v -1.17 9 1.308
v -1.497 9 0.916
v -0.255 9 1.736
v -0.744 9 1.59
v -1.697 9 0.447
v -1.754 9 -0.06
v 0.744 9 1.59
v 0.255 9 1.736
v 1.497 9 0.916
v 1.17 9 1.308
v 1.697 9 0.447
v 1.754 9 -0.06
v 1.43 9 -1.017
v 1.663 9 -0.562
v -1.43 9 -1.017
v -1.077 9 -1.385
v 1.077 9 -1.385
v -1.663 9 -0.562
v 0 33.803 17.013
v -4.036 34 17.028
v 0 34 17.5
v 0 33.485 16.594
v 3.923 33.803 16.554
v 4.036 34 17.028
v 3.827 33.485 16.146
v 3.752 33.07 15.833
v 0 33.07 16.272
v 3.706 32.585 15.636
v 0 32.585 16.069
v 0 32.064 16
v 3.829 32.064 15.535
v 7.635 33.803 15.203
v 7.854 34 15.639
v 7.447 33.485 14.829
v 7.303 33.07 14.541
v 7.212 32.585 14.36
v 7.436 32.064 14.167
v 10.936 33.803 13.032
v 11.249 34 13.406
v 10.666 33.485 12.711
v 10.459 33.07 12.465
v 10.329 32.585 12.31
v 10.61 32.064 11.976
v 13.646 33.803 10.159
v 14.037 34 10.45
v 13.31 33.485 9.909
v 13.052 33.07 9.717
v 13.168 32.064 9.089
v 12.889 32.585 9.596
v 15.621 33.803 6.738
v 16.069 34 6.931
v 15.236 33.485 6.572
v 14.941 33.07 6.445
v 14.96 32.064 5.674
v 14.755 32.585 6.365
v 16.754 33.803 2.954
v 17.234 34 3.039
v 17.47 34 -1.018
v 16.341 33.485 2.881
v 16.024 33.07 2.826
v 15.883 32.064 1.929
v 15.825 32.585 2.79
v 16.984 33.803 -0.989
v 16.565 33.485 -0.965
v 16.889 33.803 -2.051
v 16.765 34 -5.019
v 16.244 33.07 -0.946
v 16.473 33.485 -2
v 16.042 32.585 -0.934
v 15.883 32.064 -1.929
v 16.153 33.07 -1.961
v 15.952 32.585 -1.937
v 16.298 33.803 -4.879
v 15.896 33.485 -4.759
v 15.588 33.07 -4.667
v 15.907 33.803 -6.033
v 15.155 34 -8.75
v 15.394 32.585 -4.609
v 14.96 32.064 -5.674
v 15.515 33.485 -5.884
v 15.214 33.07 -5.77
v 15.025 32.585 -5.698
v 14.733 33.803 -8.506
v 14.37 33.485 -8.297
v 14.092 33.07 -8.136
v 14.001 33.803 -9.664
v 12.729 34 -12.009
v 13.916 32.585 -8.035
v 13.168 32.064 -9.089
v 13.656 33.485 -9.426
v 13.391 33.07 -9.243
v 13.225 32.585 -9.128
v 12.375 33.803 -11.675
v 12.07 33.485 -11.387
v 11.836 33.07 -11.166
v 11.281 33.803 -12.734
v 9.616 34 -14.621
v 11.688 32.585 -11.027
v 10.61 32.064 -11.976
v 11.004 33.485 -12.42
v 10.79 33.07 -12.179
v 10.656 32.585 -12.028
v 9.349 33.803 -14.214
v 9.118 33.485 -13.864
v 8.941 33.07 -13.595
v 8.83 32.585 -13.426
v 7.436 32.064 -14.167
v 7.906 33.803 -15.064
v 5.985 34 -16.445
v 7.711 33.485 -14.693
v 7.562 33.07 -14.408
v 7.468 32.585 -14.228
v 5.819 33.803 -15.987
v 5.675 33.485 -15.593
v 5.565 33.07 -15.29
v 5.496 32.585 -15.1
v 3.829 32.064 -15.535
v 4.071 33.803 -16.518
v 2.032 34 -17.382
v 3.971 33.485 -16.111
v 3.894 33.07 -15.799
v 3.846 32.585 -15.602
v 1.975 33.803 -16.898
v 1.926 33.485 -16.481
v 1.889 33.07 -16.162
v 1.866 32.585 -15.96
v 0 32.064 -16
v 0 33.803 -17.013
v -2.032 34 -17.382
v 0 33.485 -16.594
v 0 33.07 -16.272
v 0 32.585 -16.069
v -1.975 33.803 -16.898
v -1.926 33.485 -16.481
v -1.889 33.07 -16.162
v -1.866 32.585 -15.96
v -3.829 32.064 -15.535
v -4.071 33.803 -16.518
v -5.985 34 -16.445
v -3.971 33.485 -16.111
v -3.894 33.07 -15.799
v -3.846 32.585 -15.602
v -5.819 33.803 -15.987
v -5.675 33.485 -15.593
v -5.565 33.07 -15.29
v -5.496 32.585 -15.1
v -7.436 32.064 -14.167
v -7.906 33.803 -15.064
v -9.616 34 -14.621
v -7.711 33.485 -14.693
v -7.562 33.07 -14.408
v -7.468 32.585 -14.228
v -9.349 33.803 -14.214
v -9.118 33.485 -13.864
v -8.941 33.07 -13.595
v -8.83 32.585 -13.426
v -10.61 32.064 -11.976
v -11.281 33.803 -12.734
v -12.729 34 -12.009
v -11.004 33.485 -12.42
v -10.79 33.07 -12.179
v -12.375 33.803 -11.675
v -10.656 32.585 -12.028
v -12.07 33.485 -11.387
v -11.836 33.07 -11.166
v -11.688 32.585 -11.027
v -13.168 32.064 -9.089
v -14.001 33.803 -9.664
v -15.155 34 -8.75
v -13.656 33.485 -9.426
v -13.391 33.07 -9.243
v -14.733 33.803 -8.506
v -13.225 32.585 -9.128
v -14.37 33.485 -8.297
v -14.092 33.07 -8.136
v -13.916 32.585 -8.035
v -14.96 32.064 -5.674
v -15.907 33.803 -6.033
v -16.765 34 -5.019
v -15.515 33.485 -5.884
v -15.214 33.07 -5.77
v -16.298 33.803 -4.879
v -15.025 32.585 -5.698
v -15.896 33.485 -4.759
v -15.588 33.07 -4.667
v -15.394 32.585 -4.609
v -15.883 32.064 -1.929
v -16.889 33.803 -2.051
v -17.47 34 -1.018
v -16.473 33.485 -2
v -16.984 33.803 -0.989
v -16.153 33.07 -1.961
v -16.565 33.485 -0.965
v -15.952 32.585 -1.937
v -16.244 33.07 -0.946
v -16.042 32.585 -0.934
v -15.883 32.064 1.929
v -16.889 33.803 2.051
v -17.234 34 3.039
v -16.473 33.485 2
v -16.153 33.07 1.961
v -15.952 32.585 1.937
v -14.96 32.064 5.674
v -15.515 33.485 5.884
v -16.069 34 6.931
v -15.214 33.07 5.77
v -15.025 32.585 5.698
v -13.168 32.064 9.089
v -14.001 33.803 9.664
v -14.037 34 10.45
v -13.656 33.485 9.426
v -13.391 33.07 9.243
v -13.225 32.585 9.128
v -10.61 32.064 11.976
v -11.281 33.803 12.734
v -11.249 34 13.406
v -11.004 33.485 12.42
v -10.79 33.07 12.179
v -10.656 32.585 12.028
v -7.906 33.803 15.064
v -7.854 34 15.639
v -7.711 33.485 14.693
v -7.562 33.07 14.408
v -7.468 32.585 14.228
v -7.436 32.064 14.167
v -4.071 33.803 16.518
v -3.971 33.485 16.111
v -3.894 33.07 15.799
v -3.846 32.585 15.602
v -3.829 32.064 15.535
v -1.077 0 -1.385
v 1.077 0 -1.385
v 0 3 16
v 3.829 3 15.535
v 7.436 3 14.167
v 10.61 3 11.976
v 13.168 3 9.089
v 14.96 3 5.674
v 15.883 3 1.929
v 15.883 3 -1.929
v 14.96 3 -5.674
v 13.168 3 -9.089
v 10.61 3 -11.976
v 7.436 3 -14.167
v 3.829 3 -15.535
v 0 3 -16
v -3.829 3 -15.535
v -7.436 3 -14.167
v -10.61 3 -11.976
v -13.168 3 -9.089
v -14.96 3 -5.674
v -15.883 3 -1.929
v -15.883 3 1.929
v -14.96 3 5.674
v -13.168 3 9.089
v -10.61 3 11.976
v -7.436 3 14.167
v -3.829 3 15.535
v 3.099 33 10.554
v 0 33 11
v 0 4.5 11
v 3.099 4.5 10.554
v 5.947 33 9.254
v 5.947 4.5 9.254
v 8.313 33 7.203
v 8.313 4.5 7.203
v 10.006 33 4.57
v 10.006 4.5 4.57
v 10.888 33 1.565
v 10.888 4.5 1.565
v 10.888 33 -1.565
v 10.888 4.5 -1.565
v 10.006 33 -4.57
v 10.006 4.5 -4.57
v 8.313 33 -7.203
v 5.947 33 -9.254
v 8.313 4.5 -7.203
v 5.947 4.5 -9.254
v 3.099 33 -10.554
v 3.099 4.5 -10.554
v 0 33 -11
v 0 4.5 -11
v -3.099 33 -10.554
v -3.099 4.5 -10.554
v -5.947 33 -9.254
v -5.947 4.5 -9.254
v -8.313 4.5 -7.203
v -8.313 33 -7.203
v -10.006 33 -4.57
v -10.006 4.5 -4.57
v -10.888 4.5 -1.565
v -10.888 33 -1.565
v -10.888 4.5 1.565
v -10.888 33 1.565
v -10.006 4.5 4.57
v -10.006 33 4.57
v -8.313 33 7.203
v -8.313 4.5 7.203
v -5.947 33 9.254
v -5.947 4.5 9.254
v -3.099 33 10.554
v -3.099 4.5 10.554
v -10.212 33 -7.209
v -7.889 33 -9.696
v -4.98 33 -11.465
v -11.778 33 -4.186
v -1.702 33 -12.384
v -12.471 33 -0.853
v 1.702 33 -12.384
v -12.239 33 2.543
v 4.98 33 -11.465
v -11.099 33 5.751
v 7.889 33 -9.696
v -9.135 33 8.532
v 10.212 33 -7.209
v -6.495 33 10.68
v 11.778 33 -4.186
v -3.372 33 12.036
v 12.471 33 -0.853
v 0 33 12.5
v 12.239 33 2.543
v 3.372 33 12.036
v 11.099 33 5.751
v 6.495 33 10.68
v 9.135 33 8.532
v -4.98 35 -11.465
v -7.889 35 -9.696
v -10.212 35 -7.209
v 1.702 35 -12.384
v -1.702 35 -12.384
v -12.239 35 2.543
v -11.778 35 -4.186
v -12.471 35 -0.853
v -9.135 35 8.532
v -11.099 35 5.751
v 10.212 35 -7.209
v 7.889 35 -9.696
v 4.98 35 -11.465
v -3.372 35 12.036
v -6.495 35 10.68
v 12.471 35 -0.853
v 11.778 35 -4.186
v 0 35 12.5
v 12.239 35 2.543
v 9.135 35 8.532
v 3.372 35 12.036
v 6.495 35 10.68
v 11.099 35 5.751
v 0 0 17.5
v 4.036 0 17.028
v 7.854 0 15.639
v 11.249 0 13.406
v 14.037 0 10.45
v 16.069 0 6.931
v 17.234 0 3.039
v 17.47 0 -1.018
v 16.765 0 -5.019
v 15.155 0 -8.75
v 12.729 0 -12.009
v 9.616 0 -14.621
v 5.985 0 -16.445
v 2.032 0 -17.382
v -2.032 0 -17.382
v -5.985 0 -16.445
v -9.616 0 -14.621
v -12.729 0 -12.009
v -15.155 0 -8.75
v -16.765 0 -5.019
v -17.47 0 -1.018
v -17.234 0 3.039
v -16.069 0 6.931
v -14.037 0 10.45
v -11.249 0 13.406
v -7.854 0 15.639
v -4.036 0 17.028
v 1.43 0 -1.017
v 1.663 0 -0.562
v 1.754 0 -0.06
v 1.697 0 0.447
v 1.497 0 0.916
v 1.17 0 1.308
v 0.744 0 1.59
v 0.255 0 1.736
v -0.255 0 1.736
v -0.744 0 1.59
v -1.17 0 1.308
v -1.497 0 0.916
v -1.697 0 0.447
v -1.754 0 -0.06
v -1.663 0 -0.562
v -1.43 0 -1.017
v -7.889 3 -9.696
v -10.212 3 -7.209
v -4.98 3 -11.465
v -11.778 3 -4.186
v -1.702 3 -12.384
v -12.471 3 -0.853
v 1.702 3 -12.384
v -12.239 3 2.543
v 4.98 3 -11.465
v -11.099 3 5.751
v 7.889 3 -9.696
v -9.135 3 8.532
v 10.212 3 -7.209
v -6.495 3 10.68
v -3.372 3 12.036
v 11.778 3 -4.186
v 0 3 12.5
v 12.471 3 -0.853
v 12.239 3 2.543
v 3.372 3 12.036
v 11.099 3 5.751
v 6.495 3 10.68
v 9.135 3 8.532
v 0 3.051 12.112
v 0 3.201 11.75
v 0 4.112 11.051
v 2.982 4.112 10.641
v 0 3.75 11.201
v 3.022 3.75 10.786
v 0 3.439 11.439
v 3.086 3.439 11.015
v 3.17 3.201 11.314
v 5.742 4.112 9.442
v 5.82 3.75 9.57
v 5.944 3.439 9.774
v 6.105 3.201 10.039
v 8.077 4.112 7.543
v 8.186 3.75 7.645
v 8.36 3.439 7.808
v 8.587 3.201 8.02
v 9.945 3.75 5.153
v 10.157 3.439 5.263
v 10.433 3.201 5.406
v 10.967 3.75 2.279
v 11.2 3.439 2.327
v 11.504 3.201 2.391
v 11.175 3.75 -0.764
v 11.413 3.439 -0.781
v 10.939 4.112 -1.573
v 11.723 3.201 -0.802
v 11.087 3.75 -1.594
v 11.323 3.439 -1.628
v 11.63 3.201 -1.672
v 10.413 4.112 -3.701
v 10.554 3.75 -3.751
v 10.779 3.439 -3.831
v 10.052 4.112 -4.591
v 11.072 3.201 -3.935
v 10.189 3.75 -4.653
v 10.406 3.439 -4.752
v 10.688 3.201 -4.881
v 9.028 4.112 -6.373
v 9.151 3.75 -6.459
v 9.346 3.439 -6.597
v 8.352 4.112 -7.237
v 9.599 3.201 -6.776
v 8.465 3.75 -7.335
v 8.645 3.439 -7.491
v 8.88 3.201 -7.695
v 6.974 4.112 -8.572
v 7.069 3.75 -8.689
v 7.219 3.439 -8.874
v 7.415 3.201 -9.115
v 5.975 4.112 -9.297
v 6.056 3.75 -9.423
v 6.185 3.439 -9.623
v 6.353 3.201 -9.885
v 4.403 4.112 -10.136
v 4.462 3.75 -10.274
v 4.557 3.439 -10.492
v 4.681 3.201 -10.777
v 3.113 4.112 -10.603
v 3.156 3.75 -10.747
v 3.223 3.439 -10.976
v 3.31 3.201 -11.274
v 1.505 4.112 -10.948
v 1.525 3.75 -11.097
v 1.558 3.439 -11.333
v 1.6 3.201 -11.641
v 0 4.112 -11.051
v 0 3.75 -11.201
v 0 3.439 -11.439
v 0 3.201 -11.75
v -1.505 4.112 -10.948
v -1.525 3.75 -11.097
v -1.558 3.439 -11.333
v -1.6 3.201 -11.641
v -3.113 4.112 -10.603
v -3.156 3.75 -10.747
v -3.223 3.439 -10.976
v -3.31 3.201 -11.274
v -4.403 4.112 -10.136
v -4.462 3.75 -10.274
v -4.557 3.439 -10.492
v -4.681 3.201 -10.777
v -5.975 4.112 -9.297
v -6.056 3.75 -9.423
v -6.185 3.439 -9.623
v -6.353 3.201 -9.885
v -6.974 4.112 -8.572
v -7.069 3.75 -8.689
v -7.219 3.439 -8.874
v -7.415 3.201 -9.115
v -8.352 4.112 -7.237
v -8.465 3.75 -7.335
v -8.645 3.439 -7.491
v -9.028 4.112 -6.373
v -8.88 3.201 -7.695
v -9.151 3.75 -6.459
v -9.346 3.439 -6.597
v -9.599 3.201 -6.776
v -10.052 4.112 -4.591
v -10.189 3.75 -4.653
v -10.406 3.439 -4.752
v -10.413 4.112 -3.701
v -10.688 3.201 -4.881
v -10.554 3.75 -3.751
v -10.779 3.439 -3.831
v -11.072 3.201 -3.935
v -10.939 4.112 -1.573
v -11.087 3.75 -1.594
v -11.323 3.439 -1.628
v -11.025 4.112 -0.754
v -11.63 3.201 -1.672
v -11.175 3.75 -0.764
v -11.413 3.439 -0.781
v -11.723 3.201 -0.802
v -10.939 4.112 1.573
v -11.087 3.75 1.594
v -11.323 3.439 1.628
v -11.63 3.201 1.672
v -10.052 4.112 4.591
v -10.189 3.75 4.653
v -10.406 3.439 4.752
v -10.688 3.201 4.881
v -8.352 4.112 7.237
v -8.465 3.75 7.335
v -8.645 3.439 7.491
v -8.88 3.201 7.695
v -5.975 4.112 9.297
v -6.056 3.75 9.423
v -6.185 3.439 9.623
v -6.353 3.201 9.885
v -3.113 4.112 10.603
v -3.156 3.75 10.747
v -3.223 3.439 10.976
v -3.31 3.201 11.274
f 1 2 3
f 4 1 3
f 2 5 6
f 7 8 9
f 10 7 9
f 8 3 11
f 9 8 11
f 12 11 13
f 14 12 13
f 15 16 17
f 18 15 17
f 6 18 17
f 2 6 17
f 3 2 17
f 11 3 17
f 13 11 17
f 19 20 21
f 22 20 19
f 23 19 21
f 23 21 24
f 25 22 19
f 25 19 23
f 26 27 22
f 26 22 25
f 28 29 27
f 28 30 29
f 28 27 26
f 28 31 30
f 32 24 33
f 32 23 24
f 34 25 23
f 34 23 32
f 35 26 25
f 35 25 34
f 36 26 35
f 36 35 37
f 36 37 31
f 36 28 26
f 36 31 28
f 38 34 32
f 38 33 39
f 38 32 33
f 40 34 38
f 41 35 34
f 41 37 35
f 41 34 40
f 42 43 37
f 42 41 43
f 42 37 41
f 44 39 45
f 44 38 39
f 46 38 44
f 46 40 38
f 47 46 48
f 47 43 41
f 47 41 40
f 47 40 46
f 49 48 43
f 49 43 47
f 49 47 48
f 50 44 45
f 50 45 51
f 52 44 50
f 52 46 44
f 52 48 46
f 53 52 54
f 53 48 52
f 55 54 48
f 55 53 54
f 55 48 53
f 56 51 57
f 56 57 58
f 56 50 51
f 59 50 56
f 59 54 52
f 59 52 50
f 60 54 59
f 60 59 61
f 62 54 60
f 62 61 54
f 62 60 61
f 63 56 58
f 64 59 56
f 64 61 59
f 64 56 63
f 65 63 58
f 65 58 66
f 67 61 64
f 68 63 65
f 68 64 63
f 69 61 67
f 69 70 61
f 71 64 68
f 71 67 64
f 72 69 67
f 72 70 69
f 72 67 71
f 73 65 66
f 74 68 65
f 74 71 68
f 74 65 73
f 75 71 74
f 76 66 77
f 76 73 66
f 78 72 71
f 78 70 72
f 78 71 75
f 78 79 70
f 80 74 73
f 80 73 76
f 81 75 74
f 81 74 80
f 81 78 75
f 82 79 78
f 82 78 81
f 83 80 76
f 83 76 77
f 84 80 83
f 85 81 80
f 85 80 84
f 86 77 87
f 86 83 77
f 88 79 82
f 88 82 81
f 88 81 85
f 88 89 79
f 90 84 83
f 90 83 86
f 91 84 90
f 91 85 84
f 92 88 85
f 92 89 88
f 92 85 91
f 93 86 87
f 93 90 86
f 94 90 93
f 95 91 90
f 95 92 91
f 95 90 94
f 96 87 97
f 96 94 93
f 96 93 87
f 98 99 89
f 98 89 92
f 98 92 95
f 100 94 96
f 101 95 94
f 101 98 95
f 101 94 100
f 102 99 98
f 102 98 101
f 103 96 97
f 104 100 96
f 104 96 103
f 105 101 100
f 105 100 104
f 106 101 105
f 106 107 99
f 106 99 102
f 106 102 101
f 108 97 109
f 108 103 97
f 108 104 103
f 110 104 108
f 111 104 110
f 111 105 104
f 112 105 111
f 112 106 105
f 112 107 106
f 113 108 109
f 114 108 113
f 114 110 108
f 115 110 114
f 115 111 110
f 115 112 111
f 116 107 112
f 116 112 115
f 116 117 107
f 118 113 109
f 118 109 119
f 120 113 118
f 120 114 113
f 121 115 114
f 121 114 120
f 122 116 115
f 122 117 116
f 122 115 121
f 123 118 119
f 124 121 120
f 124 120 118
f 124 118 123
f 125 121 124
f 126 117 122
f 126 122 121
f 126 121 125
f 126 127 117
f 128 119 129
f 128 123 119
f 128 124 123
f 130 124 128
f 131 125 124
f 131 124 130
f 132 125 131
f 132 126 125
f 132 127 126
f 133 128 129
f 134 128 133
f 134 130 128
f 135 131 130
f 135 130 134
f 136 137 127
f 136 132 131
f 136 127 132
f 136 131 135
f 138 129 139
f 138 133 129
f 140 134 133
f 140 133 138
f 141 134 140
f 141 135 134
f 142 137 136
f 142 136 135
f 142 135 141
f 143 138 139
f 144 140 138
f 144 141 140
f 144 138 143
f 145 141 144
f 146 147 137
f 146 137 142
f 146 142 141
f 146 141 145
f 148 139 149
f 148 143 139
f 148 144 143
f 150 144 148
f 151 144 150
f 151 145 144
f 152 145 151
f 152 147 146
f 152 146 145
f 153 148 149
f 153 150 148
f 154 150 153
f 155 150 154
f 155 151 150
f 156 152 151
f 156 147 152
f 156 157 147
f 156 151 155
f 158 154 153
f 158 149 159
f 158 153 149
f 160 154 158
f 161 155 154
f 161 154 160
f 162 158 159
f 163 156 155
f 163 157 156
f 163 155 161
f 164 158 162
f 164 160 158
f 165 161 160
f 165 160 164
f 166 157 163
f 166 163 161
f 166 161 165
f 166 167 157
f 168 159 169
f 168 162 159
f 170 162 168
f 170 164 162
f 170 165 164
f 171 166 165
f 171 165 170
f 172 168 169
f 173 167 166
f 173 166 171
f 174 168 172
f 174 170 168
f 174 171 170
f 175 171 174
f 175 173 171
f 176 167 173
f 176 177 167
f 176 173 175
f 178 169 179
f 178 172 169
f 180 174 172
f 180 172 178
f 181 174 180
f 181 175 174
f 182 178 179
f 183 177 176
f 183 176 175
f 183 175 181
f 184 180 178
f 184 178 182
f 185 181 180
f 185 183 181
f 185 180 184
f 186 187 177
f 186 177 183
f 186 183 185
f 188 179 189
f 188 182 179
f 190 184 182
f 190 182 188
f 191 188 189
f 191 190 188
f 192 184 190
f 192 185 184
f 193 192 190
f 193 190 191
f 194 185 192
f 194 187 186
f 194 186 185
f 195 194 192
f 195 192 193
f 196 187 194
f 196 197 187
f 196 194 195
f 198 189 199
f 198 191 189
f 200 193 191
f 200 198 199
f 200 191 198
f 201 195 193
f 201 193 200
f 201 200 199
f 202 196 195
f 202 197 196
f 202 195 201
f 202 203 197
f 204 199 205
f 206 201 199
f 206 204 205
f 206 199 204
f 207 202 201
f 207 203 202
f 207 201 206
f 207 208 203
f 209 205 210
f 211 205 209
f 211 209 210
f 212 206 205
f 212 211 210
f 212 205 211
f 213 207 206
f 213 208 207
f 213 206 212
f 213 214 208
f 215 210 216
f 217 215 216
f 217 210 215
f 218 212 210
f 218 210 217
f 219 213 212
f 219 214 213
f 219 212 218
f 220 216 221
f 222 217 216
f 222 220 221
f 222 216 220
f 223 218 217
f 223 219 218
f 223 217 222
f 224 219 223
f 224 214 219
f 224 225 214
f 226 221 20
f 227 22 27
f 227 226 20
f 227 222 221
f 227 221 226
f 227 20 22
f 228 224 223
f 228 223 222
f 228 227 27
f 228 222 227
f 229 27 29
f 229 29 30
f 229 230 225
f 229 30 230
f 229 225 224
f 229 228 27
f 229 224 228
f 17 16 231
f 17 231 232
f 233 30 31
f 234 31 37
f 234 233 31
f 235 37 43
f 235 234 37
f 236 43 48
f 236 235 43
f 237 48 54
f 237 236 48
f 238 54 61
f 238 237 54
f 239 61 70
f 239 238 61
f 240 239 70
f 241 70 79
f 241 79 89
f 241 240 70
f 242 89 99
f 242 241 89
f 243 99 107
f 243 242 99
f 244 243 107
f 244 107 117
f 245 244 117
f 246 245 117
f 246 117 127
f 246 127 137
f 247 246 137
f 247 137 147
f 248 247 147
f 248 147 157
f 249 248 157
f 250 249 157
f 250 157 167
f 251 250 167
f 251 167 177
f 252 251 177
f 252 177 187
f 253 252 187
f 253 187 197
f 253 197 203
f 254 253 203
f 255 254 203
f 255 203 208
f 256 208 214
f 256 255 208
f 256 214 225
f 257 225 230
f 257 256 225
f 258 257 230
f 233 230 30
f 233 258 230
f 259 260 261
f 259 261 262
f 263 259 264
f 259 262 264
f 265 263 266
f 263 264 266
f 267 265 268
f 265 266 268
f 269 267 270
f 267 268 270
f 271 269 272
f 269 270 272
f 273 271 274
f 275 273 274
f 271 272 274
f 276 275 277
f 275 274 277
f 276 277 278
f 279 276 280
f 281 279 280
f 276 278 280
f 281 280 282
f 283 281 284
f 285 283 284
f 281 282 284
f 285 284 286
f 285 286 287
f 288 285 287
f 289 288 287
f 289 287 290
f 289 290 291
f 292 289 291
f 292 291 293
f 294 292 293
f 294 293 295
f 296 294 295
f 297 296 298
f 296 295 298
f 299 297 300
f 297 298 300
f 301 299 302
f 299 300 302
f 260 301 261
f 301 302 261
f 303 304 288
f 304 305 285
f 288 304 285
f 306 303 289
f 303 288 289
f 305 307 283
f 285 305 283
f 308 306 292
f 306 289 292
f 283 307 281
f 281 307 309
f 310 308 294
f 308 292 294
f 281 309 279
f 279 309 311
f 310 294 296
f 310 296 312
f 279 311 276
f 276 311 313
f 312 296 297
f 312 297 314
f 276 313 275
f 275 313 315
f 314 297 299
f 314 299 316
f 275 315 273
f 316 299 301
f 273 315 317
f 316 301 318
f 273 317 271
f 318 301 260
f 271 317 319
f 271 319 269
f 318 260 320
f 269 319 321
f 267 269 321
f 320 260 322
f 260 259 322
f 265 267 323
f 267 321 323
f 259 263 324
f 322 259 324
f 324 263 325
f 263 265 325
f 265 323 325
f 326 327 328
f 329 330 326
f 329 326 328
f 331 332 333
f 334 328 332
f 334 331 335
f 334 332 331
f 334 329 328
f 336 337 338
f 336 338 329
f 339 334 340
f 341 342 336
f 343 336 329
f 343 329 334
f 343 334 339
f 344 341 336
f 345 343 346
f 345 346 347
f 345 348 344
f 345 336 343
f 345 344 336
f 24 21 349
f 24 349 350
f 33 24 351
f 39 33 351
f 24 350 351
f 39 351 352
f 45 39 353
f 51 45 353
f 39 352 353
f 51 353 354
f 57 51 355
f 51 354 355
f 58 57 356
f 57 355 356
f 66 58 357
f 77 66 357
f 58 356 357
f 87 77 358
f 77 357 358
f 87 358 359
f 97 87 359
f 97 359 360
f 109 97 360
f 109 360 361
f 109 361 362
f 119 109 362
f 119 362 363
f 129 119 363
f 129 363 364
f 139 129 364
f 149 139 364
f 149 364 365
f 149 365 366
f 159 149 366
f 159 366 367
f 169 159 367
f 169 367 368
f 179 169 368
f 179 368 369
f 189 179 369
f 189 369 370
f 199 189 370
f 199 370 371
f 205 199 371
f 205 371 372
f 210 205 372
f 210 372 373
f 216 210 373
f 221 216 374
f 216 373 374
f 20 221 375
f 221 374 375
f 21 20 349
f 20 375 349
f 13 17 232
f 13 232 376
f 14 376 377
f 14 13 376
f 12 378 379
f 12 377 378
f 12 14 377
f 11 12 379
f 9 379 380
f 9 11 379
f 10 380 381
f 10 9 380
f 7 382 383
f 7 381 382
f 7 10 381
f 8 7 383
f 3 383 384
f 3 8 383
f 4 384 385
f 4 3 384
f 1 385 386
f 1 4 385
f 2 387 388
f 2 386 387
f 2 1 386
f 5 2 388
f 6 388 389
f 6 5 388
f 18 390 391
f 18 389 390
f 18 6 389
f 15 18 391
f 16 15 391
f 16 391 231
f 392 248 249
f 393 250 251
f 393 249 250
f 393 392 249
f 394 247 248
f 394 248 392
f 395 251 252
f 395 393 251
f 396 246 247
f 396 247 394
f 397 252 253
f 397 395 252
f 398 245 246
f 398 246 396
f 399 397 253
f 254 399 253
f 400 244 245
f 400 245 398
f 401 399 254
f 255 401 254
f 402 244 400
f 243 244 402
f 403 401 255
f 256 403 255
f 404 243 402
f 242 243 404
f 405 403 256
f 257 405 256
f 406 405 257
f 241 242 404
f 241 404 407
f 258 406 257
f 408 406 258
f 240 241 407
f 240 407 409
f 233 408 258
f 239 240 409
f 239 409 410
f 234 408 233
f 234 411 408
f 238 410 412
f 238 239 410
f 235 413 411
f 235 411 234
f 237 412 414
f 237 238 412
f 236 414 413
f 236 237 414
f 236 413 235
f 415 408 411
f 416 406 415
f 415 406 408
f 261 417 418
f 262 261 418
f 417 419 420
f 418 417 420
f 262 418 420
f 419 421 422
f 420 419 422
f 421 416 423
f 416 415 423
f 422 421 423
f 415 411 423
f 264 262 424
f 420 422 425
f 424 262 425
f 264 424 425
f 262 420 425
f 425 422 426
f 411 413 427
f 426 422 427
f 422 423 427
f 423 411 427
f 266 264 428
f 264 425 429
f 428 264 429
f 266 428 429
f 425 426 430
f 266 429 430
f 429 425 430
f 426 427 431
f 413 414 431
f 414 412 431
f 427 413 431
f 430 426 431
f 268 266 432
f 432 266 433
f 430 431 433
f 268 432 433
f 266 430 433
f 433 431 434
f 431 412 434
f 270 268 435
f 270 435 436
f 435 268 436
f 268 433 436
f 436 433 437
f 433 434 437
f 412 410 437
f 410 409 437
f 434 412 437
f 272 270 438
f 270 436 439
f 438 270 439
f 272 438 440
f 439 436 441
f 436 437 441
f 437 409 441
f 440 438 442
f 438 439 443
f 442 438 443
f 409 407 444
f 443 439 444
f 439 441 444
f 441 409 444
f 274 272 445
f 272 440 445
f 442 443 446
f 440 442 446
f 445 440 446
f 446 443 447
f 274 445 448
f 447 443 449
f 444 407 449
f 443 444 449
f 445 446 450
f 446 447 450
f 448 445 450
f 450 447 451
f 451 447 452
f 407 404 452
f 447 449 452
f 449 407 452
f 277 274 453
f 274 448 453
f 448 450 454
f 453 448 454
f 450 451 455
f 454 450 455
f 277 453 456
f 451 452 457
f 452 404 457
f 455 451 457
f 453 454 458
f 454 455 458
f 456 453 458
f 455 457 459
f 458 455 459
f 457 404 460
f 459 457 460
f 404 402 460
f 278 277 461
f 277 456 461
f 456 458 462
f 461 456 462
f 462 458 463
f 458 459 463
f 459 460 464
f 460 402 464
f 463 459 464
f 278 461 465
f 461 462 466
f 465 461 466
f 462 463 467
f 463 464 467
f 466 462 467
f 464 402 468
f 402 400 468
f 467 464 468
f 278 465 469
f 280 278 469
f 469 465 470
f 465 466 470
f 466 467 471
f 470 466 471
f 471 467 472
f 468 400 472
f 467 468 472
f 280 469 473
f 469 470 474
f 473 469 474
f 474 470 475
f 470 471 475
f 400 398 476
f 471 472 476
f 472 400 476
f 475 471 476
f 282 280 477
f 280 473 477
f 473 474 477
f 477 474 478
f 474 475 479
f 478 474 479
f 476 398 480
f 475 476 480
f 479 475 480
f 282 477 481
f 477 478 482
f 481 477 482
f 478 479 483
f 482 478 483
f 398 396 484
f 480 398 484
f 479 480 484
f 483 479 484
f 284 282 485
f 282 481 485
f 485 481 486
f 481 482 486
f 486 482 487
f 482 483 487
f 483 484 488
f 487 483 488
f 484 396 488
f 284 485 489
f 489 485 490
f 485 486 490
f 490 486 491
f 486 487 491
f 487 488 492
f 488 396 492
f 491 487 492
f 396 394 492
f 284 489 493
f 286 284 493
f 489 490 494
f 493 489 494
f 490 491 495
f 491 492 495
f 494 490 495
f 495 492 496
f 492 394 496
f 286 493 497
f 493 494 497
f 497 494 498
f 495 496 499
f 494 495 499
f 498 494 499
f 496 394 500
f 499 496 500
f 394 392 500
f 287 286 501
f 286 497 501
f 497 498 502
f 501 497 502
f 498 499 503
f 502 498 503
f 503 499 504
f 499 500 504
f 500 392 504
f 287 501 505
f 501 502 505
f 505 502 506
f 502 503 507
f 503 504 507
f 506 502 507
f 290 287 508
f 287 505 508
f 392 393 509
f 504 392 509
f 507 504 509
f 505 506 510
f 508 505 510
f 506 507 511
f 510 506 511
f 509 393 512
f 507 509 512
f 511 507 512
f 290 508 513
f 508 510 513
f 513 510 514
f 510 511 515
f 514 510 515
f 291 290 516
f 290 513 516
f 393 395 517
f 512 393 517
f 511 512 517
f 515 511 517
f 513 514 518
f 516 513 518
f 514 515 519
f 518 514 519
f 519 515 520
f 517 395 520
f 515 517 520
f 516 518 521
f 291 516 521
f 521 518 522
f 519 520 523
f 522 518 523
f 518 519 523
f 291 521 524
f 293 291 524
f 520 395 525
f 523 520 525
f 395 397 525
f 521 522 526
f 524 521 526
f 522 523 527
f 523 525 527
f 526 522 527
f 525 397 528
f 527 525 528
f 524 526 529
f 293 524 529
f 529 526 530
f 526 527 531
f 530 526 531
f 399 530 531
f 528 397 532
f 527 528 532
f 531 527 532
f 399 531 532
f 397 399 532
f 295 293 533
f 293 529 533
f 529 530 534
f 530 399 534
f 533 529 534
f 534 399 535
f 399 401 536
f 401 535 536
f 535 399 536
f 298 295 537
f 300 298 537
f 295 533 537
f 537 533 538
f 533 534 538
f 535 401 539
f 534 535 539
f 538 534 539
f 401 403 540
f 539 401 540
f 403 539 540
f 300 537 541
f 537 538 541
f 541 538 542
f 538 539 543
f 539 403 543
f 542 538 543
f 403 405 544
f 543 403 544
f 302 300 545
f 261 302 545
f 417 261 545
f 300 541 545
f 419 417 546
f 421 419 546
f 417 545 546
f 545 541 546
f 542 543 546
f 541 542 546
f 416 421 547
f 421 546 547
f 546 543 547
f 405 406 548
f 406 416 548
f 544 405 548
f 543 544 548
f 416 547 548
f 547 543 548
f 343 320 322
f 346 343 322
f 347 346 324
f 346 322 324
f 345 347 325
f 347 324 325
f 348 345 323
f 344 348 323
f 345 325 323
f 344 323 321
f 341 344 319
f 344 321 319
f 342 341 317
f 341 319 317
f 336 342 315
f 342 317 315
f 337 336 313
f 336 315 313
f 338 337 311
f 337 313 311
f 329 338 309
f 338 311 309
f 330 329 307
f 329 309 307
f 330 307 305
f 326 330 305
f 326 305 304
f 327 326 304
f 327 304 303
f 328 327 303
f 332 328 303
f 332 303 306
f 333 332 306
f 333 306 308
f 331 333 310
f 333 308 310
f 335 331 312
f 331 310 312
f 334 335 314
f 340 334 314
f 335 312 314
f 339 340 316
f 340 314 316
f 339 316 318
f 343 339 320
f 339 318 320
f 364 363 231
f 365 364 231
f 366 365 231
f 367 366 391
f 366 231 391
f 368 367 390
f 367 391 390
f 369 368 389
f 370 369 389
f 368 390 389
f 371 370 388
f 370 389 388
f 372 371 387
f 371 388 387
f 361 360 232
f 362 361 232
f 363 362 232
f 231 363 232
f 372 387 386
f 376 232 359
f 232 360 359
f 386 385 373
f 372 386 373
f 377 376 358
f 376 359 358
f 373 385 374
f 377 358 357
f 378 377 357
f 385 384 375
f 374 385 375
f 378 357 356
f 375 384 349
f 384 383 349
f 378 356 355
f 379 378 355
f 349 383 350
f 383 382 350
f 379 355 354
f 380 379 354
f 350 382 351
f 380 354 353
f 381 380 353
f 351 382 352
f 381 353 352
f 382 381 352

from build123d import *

# Parameters (mm, degrees)
SKETCH1_R           = 17.5
SKETCH1_R_2         = 16
BOSS_EXTRUDE1_DEPTH = 34
SKETCH2_R           = 17.5
BOSS_EXTRUDE2_DEPTH = 3
FILLET1_R           = 2
SKETCH3_R           = 11
BOSS_EXTRUDE3_DEPTH = 30
CUT_EXTRUDE1_DEPTH  = 35
SKETCH6_W           = 7.99098924
SKETCH6_H           = 6.392791393
BOSS_EXTRUDE4_DEPTH = 24
FILLET3_R           = 1.5
SKETCH8_R           = 12.5
BOSS_EXTRUDE5_DEPTH = 2


with BuildPart() as part:
    # Sketch1 → Boss-Extrude1 (new body)
    with BuildSketch(Plane(origin=(0, 0, 0), x_dir=(1, 0, 0), z_dir=(0, 1, 0))):
        with Locations(Location((0, 0, 0), (0, 0, 270))):
            Circle(SKETCH1_R)
        with Locations(Location((0, 0, 0), (0, 0, 270))):
            Circle(SKETCH1_R_2, mode=Mode.SUBTRACT)
    extrude(amount=BOSS_EXTRUDE1_DEPTH)

    # Sketch2 → Boss-Extrude2 (add)
    with BuildSketch(Plane(origin=(0, 0, 0), x_dir=(1, 0, 0), z_dir=(0, 1, 0))):
        with Locations(Location((0, 0, 0), (0, 0, 270))):
            Circle(SKETCH2_R)
    extrude(amount=BOSS_EXTRUDE2_DEPTH)

    # Fillet1
    # the kernel refuses this fillet: 2 mm, written as the material it takes off along each edge
    with BuildSketch(Plane(origin=(0, 34, 0), x_dir=(0, 0, 1), z_dir=(-1, 0, 0))) as fillet1_piece_1:
        with BuildLine():
            CenterArc((18, -1.936491673), FILLET1_R, 104.477512186, 75.522487814)
            Line((16, -1.936491673), (15.96, -1.936491673))
            Line((15.96, -1.936491673), (15.96, 0))
            Line((15.96, 0), (16, 0.04))
            ThreePointArc((16, 0.04), (16.75, 0.04), (17.49, 0.038729833))
            Line((17.49, 0.038729833), (17.5, 0))
        make_face()
    revolve(axis=Axis((0, 34, 0), (0, 1, 0)), mode=Mode.SUBTRACT)

    # Sketch3 → Boss-Extrude3 (add)
    with BuildSketch(Plane(origin=(0, 3, 0), x_dir=(1, 0, 0), z_dir=(0, 1, 0))):
        with Locations(Location((0, 0, 0), (0, 0, 270))):
            Circle(SKETCH3_R)
    extrude(amount=BOSS_EXTRUDE3_DEPTH)

    # Sketch5 → Cut-Extrude1 (cut)
    with BuildSketch(Plane(origin=(0, 33, 0), x_dir=(1, 0, 0), z_dir=(0, 1, 0))):
        with BuildLine():
            Line((-1.077438314, 1.385334501), (1.077438314, 1.385334501))
            ThreePointArc((1.077438314, 1.385334501), (0, -1.755), (-1.077438314, 1.385334501))
        make_face()
    extrude(amount=-CUT_EXTRUDE1_DEPTH, mode=Mode.SUBTRACT)

    # Sketch6 → Boss-Extrude4 (add)
    with BuildSketch(Plane(origin=(0, 33, 0), x_dir=(1, 0, 0), z_dir=(0, 1, 0))):
        with Locations((0.014035957, -0.788514839)):
            Rectangle(SKETCH6_W, SKETCH6_H)
    extrude(amount=-BOSS_EXTRUDE4_DEPTH)

    # Fillet3
    fillet3_edges = [part.edges().sort_by_distance(p)[0] for p in [
        (0, 3, -11),
    ]]
    fillet(fillet3_edges, radius=FILLET3_R)

    # Sketch8 → Boss-Extrude5 (add)
    with BuildSketch(Plane(origin=(0, 33, 0), x_dir=(1, 0, 0), z_dir=(0, 1, 0))):
        with Locations(Location((0, 0, 0), (0, 0, 270))):
            Circle(SKETCH8_R)
    extrude(amount=BOSS_EXTRUDE5_DEPTH)


solid = part.part
